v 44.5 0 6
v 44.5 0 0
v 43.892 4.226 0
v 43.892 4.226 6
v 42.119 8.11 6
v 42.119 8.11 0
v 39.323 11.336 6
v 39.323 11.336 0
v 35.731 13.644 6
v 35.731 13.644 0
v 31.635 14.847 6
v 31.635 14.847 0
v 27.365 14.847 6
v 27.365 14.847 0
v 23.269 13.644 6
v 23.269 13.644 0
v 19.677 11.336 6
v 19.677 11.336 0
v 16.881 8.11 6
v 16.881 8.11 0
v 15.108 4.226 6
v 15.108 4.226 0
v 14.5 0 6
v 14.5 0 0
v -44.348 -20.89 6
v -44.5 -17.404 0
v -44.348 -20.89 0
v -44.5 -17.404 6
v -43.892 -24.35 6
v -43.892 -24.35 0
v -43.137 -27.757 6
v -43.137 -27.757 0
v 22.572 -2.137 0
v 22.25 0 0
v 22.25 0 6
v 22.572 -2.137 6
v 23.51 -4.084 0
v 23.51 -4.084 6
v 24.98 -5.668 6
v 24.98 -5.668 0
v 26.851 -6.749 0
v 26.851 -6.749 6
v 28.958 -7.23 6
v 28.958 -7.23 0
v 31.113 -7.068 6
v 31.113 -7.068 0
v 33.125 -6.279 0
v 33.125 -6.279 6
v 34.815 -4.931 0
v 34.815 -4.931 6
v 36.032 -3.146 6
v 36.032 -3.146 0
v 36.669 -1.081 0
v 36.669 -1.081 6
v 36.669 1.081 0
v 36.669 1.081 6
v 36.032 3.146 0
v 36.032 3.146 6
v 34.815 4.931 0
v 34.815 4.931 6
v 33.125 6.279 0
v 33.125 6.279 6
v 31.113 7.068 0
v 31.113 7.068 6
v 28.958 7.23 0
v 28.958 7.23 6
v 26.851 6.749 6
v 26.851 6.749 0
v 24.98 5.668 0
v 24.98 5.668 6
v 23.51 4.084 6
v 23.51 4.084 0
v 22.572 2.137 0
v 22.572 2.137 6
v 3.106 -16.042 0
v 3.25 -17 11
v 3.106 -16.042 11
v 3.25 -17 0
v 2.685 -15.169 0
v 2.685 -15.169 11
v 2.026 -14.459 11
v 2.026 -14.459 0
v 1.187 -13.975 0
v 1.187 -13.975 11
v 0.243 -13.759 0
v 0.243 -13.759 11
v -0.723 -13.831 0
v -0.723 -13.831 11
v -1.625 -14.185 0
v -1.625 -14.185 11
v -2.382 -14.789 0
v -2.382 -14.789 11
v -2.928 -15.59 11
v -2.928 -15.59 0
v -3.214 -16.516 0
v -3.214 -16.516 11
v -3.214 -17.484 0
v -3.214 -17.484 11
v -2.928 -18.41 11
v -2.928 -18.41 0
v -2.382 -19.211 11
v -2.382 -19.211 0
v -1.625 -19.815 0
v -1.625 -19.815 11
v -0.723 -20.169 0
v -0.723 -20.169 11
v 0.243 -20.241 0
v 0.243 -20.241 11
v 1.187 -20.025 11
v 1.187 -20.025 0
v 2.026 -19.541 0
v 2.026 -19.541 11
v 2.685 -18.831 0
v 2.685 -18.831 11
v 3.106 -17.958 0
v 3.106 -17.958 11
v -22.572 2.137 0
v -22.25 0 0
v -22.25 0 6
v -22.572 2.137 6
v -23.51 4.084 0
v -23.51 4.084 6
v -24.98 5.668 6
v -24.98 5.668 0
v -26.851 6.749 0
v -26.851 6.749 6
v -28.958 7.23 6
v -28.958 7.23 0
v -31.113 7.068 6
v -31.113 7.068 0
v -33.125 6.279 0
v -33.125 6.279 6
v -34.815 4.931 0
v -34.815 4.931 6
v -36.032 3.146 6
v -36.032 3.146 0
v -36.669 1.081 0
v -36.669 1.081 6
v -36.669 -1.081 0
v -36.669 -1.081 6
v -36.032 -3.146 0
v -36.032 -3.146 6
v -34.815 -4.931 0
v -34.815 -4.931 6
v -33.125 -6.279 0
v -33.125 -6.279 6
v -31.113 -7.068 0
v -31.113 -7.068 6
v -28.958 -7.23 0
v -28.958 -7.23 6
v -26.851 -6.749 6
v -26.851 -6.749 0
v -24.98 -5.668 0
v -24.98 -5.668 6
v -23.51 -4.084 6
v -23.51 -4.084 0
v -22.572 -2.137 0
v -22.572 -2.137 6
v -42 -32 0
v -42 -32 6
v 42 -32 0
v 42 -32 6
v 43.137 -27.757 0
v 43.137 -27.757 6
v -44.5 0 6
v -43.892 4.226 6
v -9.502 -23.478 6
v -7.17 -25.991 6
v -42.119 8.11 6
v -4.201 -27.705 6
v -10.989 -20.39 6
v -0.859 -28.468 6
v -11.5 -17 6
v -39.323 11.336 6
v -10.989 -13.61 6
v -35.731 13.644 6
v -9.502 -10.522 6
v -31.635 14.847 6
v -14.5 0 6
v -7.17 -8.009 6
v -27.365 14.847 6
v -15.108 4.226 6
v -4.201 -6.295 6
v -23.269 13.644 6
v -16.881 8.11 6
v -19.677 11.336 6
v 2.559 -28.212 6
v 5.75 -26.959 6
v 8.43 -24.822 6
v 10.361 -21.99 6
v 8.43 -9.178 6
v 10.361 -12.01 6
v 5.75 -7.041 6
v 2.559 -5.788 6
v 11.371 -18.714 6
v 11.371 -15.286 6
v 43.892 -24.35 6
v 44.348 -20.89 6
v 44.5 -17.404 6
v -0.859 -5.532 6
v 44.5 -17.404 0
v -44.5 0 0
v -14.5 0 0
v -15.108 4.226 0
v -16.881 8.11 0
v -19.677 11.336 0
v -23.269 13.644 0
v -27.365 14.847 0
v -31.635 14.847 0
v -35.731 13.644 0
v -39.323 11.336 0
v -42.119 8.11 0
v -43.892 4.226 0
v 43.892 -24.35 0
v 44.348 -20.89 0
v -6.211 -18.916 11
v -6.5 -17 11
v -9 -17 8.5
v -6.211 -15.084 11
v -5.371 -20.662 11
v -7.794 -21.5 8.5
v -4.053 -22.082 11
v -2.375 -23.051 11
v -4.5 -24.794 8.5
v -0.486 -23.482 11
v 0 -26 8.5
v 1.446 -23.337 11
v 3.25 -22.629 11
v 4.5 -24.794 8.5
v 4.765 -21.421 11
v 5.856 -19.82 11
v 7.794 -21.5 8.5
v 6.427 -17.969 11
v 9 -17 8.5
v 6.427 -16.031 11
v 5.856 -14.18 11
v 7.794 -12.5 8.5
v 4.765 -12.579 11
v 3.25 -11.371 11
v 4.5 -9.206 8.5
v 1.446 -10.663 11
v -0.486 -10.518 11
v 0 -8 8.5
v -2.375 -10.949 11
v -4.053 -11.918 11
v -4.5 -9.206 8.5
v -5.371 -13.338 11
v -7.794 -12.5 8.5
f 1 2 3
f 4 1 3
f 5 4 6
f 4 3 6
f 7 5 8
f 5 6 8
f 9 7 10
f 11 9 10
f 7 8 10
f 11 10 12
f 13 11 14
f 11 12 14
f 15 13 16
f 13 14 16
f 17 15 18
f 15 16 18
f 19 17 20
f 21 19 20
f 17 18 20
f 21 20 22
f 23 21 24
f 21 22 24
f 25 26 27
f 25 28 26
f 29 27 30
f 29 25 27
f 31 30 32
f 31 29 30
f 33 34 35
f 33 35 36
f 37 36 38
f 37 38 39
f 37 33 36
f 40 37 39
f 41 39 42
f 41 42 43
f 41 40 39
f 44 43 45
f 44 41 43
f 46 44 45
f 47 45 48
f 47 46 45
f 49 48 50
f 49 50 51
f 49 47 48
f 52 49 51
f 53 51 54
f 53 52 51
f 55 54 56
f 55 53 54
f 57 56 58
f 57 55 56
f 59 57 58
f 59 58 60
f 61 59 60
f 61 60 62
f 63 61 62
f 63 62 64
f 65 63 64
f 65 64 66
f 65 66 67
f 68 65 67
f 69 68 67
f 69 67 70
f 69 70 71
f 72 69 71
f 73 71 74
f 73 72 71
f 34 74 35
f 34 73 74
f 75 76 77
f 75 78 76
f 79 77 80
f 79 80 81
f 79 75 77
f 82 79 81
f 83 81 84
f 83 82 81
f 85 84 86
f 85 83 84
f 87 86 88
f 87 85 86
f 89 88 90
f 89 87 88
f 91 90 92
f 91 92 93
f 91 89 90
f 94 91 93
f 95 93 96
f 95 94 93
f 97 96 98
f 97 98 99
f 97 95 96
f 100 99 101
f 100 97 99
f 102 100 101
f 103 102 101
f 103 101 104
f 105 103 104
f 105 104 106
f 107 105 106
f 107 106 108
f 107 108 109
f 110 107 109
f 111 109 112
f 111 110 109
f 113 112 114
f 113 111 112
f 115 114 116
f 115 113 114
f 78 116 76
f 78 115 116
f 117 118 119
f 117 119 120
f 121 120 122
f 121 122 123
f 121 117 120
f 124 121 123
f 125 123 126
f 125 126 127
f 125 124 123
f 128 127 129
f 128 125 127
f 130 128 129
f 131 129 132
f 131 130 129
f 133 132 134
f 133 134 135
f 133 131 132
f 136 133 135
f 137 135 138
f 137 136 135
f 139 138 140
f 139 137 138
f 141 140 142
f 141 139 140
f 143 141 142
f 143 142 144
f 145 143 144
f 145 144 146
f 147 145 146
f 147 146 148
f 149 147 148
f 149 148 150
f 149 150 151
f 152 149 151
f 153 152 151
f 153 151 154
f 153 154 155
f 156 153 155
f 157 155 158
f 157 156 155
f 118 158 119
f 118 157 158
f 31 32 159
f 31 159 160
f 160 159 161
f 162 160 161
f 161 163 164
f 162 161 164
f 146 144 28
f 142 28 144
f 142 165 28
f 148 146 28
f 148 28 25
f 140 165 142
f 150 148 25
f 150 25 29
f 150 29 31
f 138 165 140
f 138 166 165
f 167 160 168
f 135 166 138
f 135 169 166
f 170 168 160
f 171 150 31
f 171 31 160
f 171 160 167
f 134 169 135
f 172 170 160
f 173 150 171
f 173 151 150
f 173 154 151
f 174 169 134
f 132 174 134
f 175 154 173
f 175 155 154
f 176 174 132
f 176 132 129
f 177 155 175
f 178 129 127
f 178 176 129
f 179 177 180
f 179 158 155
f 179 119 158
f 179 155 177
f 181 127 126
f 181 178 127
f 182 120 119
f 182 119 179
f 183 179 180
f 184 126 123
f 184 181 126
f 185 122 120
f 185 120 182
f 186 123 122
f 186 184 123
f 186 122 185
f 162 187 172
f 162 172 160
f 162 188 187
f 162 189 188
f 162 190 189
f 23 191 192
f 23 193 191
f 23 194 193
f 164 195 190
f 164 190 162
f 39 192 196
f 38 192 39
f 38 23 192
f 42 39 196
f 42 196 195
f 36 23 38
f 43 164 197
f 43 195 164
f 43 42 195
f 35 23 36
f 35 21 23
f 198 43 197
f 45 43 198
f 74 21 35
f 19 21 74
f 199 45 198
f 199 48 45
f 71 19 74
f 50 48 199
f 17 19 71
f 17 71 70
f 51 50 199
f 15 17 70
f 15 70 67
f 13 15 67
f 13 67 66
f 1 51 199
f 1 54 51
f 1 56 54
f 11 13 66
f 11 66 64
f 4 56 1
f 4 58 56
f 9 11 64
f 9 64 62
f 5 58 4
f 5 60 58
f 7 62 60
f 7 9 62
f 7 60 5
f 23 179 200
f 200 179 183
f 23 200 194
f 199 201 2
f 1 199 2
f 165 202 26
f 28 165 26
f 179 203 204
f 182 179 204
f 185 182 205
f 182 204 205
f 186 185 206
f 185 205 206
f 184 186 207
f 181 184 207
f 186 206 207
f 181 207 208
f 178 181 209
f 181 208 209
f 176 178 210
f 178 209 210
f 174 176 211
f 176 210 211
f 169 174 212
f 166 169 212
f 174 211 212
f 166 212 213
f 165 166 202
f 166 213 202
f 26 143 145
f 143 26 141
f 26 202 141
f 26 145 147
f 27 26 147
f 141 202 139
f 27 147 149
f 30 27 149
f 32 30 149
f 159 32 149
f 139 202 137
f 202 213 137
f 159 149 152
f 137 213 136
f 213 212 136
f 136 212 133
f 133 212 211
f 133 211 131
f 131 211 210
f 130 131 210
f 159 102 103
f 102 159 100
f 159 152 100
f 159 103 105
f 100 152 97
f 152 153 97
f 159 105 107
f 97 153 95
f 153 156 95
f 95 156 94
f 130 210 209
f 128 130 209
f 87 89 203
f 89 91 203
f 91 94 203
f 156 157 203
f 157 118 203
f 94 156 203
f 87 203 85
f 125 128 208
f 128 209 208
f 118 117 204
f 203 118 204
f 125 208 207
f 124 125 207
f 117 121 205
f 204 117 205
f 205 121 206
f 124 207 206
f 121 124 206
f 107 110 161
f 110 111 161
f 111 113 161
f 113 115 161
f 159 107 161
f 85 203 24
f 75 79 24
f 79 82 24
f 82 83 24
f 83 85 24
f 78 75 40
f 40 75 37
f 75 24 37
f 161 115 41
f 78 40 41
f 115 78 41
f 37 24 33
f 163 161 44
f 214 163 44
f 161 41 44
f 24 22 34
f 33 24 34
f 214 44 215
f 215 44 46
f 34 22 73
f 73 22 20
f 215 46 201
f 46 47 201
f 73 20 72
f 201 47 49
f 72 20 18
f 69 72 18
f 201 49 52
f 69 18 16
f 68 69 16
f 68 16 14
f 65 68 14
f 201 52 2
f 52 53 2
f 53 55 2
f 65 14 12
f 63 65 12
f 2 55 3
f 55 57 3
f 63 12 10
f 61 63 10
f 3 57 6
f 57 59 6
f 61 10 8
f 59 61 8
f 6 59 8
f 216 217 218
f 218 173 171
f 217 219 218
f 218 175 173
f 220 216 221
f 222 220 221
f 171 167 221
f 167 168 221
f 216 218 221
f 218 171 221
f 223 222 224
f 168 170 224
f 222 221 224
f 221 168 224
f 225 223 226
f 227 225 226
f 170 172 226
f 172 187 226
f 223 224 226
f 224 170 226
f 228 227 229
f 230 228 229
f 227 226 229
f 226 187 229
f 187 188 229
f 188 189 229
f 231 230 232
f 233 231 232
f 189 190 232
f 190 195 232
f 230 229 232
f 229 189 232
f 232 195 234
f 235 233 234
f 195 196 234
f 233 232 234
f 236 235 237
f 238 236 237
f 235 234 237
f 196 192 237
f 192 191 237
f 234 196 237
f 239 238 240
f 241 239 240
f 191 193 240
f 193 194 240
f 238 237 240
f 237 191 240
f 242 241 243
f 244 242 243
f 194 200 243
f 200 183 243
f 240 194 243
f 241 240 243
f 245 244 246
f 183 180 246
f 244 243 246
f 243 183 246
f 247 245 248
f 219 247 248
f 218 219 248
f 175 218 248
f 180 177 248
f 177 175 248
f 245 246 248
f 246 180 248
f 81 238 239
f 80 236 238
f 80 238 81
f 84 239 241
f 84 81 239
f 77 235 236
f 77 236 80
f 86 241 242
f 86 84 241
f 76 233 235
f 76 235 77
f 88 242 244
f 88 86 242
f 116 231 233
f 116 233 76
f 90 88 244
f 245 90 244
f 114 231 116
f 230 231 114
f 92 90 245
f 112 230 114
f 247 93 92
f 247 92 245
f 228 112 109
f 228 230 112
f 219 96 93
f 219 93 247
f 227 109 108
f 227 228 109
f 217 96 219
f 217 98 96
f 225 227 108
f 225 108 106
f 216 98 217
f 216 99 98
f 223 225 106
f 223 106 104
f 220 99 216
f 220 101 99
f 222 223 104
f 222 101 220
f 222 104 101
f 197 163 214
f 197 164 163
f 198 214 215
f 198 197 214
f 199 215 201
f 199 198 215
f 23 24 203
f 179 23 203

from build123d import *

# Parameters (mm, degrees)
SKETCH1_R           = 7.25
SKETCH1_R_2         = 3.25
BOSS_EXTRUDE1_DEPTH = 6
SKETCH2_R           = 6.5
SKETCH2_R_2         = 3.25
BOSS_EXTRUDE2_DEPTH = 5
CHAMFER1_SIZE       = 5
CHAMFER2_SIZE       = 2.5
CHAMFER2_SIZE2      = 9.330127019
FILLET1_R           = 40
CHAMFER3_SIZE       = 2.5
CHAMFER3_SIZE2      = 9.330127019
FILLET2_R           = 40


with BuildPart() as part:
    # Sketch1 → Boss-Extrude1 (new body)
    with BuildSketch(Plane.XY):
        with BuildLine():
            Line((-44.5, 0), (-44.5, -32))
            Line((-44.5, -32), (44.5, -32))
            Line((44.5, -32), (44.5, 0))
            ThreePointArc((44.5, 0), (29.5, 15), (14.5, 0))
            Line((14.5, 0), (-14.5, 0))
            ThreePointArc((-14.5, 0), (-29.5, 15), (-44.5, 0))
        make_face()
        with Locations((-29.5, 0)):
            Circle(SKETCH1_R, mode=Mode.SUBTRACT)
        with Locations(Location((29.5, 0, 0), (0, 0, 180))):
            Circle(SKETCH1_R, mode=Mode.SUBTRACT)
        with Locations((0, -17)):
            Circle(SKETCH1_R_2, mode=Mode.SUBTRACT)
    extrude(amount=BOSS_EXTRUDE1_DEPTH)

    # Sketch2 → Boss-Extrude2 (add)
    with BuildSketch(Plane.XY.offset(6)):
        with Locations(Location((0, -17, 0), (0, 0, 180))):
            Circle(SKETCH2_R)
        with Locations((0, -17)):
            Circle(SKETCH2_R_2, mode=Mode.SUBTRACT)
    extrude(amount=BOSS_EXTRUDE2_DEPTH)

    # Chamfer1
    chamfer1_edges = [part.edges().sort_by_distance(p)[0] for p in [
        (6.5, -17, 6),
    ]]
    chamfer(chamfer1_edges, length=CHAMFER1_SIZE - 0.0001)  # a hair under: the kernel refuses the full size

    # Chamfer2
    chamfer2_edges = [part.edges().sort_by_distance(p)[0] for p in [
        (-44.5, -32, 3),
    ]]
    chamfer2_side = [part.faces().sort_by_distance(p)[0] for p in [
        (0, -32, 3),
    ]]
    chamfer(chamfer2_edges, length=CHAMFER2_SIZE, length2=CHAMFER2_SIZE2, reference=chamfer2_side[0])

    # Fillet1
    fillet1_edges = [part.edges().sort_by_distance(p)[0] for p in [
        (-44.5, -22.669872981, 3),
    ]]
    fillet(fillet1_edges, radius=FILLET1_R)

    # Chamfer3
    chamfer3_edges = [part.edges().sort_by_distance(p)[0] for p in [
        (44.5, -32, 3),
    ]]
    chamfer3_side = [part.faces().sort_by_distance(p)[0] for p in [
        (1.25, -32, 3),
    ]]
    chamfer(chamfer3_edges, length=CHAMFER3_SIZE, length2=CHAMFER3_SIZE2, reference=chamfer3_side[0])

    # Fillet2
    fillet2_edges = [part.edges().sort_by_distance(p)[0] for p in [
        (44.5, -22.669872981, 3),
    ]]
    fillet(fillet2_edges, radius=FILLET2_R)


solid = part.part
